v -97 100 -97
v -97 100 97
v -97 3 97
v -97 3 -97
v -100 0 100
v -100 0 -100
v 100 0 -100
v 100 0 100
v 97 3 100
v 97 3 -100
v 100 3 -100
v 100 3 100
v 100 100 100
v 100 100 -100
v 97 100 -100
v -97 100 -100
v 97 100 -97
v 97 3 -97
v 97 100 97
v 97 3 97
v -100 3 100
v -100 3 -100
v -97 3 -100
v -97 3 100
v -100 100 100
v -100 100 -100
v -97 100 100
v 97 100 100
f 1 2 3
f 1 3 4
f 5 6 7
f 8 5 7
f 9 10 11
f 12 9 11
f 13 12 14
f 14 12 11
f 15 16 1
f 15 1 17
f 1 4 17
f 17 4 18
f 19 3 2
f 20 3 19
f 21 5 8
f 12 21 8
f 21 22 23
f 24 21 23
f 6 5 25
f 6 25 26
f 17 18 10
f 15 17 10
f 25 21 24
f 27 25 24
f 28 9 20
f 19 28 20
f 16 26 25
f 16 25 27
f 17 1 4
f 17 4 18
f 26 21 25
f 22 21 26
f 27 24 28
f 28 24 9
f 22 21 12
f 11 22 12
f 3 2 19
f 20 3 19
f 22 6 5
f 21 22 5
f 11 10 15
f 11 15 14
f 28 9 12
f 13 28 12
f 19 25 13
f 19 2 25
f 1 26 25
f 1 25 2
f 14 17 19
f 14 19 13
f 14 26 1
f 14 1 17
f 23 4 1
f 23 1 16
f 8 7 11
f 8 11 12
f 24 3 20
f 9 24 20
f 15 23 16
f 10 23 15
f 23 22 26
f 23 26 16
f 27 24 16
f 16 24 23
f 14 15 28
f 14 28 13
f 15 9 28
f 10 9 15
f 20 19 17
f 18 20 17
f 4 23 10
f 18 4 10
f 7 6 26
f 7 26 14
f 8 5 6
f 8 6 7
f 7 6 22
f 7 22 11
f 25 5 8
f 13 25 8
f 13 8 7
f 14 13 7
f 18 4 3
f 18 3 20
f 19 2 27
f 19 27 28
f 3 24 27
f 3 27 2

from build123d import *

# Parameters (mm, degrees)
SKETCH1_W             = 200
SKETCH1_H             = 200
BOSS_EXTRUDE1_DEPTH   = 100
SKETCH2_W             = 194
SKETCH2_H             = 194
CUT_EXTRUDE1_DEPTH    = 97
SKETCH3_W             = 200
SKETCH3_H             = 200
BOSS_EXTRUDE2_DEPTH   = 3
SKETCH4_W             = 3
SKETCH4_H             = 200
BOSS_EXTRUDE3_DEPTH   = 97
BOSS_EXTRUDE3_2_DEPTH = 97
SKETCH5_W             = 194
SKETCH5_H             = 3
BOSS_EXTRUDE4_DEPTH   = 97
BOSS_EXTRUDE4_2_DEPTH = 97


with BuildPart() as part:
    # Sketch1 → Boss-Extrude1 (new body)
    with BuildSketch(Plane(origin=(0, 0, 0), x_dir=(1, 0, 0), z_dir=(0, 1, 0))):
        Rectangle(SKETCH1_W, SKETCH1_H)
    extrude(amount=BOSS_EXTRUDE1_DEPTH)

    # Sketch2 → Cut-Extrude1 (cut)
    with BuildSketch(Plane(origin=(0, 100, 0), x_dir=(1, 0, 0), z_dir=(0, 1, 0))):
        Rectangle(SKETCH2_W, SKETCH2_H)
    extrude(amount=-CUT_EXTRUDE1_DEPTH, mode=Mode.SUBTRACT)


with BuildPart() as body_2:
    # Sketch3 → Boss-Extrude2 (new body)
    with BuildSketch(Plane.XZ):
        Rectangle(SKETCH3_W, SKETCH3_H)
    extrude(amount=-BOSS_EXTRUDE2_DEPTH)


with BuildPart() as body_3:
    # Sketch4 → Boss-Extrude3 (new body)
    with BuildSketch(Plane(origin=(0, 3, 0), x_dir=(1, 0, 0), z_dir=(0, 1, 0))):
        with Locations((-98.5, 0)):
            Rectangle(SKETCH4_W, SKETCH4_H)
    extrude(amount=BOSS_EXTRUDE3_DEPTH)


with BuildPart() as body_4:
    # Sketch4 → Boss-Extrude3 2 (new body)
    with BuildSketch(Plane(origin=(0, 3, 0), x_dir=(1, 0, 0), z_dir=(0, 1, 0))):
        with Locations((98.5, 0)):
            Rectangle(SKETCH4_W, SKETCH4_H)
    extrude(amount=BOSS_EXTRUDE3_2_DEPTH)


with BuildPart() as body_5:
    # Sketch5 → Boss-Extrude4 (new body)
    with BuildSketch(Plane(origin=(0, 3, 0), x_dir=(1, 0, 0), z_dir=(0, 1, 0))):
        with Locations((0, 98.5)):
            Rectangle(SKETCH5_W, SKETCH5_H)
    extrude(amount=BOSS_EXTRUDE4_DEPTH)


with BuildPart() as body_6:
    # Sketch5 → Boss-Extrude4 2 (new body)
    with BuildSketch(Plane(origin=(0, 3, 0), x_dir=(1, 0, 0), z_dir=(0, 1, 0))):
        with Locations((0, -98.5)):
            Rectangle(SKETCH5_W, SKETCH5_H)
    extrude(amount=BOSS_EXTRUDE4_2_DEPTH)


solid = Compound([part.part, body_2.part, body_3.part, body_4.part, body_5.part, body_6.part])
